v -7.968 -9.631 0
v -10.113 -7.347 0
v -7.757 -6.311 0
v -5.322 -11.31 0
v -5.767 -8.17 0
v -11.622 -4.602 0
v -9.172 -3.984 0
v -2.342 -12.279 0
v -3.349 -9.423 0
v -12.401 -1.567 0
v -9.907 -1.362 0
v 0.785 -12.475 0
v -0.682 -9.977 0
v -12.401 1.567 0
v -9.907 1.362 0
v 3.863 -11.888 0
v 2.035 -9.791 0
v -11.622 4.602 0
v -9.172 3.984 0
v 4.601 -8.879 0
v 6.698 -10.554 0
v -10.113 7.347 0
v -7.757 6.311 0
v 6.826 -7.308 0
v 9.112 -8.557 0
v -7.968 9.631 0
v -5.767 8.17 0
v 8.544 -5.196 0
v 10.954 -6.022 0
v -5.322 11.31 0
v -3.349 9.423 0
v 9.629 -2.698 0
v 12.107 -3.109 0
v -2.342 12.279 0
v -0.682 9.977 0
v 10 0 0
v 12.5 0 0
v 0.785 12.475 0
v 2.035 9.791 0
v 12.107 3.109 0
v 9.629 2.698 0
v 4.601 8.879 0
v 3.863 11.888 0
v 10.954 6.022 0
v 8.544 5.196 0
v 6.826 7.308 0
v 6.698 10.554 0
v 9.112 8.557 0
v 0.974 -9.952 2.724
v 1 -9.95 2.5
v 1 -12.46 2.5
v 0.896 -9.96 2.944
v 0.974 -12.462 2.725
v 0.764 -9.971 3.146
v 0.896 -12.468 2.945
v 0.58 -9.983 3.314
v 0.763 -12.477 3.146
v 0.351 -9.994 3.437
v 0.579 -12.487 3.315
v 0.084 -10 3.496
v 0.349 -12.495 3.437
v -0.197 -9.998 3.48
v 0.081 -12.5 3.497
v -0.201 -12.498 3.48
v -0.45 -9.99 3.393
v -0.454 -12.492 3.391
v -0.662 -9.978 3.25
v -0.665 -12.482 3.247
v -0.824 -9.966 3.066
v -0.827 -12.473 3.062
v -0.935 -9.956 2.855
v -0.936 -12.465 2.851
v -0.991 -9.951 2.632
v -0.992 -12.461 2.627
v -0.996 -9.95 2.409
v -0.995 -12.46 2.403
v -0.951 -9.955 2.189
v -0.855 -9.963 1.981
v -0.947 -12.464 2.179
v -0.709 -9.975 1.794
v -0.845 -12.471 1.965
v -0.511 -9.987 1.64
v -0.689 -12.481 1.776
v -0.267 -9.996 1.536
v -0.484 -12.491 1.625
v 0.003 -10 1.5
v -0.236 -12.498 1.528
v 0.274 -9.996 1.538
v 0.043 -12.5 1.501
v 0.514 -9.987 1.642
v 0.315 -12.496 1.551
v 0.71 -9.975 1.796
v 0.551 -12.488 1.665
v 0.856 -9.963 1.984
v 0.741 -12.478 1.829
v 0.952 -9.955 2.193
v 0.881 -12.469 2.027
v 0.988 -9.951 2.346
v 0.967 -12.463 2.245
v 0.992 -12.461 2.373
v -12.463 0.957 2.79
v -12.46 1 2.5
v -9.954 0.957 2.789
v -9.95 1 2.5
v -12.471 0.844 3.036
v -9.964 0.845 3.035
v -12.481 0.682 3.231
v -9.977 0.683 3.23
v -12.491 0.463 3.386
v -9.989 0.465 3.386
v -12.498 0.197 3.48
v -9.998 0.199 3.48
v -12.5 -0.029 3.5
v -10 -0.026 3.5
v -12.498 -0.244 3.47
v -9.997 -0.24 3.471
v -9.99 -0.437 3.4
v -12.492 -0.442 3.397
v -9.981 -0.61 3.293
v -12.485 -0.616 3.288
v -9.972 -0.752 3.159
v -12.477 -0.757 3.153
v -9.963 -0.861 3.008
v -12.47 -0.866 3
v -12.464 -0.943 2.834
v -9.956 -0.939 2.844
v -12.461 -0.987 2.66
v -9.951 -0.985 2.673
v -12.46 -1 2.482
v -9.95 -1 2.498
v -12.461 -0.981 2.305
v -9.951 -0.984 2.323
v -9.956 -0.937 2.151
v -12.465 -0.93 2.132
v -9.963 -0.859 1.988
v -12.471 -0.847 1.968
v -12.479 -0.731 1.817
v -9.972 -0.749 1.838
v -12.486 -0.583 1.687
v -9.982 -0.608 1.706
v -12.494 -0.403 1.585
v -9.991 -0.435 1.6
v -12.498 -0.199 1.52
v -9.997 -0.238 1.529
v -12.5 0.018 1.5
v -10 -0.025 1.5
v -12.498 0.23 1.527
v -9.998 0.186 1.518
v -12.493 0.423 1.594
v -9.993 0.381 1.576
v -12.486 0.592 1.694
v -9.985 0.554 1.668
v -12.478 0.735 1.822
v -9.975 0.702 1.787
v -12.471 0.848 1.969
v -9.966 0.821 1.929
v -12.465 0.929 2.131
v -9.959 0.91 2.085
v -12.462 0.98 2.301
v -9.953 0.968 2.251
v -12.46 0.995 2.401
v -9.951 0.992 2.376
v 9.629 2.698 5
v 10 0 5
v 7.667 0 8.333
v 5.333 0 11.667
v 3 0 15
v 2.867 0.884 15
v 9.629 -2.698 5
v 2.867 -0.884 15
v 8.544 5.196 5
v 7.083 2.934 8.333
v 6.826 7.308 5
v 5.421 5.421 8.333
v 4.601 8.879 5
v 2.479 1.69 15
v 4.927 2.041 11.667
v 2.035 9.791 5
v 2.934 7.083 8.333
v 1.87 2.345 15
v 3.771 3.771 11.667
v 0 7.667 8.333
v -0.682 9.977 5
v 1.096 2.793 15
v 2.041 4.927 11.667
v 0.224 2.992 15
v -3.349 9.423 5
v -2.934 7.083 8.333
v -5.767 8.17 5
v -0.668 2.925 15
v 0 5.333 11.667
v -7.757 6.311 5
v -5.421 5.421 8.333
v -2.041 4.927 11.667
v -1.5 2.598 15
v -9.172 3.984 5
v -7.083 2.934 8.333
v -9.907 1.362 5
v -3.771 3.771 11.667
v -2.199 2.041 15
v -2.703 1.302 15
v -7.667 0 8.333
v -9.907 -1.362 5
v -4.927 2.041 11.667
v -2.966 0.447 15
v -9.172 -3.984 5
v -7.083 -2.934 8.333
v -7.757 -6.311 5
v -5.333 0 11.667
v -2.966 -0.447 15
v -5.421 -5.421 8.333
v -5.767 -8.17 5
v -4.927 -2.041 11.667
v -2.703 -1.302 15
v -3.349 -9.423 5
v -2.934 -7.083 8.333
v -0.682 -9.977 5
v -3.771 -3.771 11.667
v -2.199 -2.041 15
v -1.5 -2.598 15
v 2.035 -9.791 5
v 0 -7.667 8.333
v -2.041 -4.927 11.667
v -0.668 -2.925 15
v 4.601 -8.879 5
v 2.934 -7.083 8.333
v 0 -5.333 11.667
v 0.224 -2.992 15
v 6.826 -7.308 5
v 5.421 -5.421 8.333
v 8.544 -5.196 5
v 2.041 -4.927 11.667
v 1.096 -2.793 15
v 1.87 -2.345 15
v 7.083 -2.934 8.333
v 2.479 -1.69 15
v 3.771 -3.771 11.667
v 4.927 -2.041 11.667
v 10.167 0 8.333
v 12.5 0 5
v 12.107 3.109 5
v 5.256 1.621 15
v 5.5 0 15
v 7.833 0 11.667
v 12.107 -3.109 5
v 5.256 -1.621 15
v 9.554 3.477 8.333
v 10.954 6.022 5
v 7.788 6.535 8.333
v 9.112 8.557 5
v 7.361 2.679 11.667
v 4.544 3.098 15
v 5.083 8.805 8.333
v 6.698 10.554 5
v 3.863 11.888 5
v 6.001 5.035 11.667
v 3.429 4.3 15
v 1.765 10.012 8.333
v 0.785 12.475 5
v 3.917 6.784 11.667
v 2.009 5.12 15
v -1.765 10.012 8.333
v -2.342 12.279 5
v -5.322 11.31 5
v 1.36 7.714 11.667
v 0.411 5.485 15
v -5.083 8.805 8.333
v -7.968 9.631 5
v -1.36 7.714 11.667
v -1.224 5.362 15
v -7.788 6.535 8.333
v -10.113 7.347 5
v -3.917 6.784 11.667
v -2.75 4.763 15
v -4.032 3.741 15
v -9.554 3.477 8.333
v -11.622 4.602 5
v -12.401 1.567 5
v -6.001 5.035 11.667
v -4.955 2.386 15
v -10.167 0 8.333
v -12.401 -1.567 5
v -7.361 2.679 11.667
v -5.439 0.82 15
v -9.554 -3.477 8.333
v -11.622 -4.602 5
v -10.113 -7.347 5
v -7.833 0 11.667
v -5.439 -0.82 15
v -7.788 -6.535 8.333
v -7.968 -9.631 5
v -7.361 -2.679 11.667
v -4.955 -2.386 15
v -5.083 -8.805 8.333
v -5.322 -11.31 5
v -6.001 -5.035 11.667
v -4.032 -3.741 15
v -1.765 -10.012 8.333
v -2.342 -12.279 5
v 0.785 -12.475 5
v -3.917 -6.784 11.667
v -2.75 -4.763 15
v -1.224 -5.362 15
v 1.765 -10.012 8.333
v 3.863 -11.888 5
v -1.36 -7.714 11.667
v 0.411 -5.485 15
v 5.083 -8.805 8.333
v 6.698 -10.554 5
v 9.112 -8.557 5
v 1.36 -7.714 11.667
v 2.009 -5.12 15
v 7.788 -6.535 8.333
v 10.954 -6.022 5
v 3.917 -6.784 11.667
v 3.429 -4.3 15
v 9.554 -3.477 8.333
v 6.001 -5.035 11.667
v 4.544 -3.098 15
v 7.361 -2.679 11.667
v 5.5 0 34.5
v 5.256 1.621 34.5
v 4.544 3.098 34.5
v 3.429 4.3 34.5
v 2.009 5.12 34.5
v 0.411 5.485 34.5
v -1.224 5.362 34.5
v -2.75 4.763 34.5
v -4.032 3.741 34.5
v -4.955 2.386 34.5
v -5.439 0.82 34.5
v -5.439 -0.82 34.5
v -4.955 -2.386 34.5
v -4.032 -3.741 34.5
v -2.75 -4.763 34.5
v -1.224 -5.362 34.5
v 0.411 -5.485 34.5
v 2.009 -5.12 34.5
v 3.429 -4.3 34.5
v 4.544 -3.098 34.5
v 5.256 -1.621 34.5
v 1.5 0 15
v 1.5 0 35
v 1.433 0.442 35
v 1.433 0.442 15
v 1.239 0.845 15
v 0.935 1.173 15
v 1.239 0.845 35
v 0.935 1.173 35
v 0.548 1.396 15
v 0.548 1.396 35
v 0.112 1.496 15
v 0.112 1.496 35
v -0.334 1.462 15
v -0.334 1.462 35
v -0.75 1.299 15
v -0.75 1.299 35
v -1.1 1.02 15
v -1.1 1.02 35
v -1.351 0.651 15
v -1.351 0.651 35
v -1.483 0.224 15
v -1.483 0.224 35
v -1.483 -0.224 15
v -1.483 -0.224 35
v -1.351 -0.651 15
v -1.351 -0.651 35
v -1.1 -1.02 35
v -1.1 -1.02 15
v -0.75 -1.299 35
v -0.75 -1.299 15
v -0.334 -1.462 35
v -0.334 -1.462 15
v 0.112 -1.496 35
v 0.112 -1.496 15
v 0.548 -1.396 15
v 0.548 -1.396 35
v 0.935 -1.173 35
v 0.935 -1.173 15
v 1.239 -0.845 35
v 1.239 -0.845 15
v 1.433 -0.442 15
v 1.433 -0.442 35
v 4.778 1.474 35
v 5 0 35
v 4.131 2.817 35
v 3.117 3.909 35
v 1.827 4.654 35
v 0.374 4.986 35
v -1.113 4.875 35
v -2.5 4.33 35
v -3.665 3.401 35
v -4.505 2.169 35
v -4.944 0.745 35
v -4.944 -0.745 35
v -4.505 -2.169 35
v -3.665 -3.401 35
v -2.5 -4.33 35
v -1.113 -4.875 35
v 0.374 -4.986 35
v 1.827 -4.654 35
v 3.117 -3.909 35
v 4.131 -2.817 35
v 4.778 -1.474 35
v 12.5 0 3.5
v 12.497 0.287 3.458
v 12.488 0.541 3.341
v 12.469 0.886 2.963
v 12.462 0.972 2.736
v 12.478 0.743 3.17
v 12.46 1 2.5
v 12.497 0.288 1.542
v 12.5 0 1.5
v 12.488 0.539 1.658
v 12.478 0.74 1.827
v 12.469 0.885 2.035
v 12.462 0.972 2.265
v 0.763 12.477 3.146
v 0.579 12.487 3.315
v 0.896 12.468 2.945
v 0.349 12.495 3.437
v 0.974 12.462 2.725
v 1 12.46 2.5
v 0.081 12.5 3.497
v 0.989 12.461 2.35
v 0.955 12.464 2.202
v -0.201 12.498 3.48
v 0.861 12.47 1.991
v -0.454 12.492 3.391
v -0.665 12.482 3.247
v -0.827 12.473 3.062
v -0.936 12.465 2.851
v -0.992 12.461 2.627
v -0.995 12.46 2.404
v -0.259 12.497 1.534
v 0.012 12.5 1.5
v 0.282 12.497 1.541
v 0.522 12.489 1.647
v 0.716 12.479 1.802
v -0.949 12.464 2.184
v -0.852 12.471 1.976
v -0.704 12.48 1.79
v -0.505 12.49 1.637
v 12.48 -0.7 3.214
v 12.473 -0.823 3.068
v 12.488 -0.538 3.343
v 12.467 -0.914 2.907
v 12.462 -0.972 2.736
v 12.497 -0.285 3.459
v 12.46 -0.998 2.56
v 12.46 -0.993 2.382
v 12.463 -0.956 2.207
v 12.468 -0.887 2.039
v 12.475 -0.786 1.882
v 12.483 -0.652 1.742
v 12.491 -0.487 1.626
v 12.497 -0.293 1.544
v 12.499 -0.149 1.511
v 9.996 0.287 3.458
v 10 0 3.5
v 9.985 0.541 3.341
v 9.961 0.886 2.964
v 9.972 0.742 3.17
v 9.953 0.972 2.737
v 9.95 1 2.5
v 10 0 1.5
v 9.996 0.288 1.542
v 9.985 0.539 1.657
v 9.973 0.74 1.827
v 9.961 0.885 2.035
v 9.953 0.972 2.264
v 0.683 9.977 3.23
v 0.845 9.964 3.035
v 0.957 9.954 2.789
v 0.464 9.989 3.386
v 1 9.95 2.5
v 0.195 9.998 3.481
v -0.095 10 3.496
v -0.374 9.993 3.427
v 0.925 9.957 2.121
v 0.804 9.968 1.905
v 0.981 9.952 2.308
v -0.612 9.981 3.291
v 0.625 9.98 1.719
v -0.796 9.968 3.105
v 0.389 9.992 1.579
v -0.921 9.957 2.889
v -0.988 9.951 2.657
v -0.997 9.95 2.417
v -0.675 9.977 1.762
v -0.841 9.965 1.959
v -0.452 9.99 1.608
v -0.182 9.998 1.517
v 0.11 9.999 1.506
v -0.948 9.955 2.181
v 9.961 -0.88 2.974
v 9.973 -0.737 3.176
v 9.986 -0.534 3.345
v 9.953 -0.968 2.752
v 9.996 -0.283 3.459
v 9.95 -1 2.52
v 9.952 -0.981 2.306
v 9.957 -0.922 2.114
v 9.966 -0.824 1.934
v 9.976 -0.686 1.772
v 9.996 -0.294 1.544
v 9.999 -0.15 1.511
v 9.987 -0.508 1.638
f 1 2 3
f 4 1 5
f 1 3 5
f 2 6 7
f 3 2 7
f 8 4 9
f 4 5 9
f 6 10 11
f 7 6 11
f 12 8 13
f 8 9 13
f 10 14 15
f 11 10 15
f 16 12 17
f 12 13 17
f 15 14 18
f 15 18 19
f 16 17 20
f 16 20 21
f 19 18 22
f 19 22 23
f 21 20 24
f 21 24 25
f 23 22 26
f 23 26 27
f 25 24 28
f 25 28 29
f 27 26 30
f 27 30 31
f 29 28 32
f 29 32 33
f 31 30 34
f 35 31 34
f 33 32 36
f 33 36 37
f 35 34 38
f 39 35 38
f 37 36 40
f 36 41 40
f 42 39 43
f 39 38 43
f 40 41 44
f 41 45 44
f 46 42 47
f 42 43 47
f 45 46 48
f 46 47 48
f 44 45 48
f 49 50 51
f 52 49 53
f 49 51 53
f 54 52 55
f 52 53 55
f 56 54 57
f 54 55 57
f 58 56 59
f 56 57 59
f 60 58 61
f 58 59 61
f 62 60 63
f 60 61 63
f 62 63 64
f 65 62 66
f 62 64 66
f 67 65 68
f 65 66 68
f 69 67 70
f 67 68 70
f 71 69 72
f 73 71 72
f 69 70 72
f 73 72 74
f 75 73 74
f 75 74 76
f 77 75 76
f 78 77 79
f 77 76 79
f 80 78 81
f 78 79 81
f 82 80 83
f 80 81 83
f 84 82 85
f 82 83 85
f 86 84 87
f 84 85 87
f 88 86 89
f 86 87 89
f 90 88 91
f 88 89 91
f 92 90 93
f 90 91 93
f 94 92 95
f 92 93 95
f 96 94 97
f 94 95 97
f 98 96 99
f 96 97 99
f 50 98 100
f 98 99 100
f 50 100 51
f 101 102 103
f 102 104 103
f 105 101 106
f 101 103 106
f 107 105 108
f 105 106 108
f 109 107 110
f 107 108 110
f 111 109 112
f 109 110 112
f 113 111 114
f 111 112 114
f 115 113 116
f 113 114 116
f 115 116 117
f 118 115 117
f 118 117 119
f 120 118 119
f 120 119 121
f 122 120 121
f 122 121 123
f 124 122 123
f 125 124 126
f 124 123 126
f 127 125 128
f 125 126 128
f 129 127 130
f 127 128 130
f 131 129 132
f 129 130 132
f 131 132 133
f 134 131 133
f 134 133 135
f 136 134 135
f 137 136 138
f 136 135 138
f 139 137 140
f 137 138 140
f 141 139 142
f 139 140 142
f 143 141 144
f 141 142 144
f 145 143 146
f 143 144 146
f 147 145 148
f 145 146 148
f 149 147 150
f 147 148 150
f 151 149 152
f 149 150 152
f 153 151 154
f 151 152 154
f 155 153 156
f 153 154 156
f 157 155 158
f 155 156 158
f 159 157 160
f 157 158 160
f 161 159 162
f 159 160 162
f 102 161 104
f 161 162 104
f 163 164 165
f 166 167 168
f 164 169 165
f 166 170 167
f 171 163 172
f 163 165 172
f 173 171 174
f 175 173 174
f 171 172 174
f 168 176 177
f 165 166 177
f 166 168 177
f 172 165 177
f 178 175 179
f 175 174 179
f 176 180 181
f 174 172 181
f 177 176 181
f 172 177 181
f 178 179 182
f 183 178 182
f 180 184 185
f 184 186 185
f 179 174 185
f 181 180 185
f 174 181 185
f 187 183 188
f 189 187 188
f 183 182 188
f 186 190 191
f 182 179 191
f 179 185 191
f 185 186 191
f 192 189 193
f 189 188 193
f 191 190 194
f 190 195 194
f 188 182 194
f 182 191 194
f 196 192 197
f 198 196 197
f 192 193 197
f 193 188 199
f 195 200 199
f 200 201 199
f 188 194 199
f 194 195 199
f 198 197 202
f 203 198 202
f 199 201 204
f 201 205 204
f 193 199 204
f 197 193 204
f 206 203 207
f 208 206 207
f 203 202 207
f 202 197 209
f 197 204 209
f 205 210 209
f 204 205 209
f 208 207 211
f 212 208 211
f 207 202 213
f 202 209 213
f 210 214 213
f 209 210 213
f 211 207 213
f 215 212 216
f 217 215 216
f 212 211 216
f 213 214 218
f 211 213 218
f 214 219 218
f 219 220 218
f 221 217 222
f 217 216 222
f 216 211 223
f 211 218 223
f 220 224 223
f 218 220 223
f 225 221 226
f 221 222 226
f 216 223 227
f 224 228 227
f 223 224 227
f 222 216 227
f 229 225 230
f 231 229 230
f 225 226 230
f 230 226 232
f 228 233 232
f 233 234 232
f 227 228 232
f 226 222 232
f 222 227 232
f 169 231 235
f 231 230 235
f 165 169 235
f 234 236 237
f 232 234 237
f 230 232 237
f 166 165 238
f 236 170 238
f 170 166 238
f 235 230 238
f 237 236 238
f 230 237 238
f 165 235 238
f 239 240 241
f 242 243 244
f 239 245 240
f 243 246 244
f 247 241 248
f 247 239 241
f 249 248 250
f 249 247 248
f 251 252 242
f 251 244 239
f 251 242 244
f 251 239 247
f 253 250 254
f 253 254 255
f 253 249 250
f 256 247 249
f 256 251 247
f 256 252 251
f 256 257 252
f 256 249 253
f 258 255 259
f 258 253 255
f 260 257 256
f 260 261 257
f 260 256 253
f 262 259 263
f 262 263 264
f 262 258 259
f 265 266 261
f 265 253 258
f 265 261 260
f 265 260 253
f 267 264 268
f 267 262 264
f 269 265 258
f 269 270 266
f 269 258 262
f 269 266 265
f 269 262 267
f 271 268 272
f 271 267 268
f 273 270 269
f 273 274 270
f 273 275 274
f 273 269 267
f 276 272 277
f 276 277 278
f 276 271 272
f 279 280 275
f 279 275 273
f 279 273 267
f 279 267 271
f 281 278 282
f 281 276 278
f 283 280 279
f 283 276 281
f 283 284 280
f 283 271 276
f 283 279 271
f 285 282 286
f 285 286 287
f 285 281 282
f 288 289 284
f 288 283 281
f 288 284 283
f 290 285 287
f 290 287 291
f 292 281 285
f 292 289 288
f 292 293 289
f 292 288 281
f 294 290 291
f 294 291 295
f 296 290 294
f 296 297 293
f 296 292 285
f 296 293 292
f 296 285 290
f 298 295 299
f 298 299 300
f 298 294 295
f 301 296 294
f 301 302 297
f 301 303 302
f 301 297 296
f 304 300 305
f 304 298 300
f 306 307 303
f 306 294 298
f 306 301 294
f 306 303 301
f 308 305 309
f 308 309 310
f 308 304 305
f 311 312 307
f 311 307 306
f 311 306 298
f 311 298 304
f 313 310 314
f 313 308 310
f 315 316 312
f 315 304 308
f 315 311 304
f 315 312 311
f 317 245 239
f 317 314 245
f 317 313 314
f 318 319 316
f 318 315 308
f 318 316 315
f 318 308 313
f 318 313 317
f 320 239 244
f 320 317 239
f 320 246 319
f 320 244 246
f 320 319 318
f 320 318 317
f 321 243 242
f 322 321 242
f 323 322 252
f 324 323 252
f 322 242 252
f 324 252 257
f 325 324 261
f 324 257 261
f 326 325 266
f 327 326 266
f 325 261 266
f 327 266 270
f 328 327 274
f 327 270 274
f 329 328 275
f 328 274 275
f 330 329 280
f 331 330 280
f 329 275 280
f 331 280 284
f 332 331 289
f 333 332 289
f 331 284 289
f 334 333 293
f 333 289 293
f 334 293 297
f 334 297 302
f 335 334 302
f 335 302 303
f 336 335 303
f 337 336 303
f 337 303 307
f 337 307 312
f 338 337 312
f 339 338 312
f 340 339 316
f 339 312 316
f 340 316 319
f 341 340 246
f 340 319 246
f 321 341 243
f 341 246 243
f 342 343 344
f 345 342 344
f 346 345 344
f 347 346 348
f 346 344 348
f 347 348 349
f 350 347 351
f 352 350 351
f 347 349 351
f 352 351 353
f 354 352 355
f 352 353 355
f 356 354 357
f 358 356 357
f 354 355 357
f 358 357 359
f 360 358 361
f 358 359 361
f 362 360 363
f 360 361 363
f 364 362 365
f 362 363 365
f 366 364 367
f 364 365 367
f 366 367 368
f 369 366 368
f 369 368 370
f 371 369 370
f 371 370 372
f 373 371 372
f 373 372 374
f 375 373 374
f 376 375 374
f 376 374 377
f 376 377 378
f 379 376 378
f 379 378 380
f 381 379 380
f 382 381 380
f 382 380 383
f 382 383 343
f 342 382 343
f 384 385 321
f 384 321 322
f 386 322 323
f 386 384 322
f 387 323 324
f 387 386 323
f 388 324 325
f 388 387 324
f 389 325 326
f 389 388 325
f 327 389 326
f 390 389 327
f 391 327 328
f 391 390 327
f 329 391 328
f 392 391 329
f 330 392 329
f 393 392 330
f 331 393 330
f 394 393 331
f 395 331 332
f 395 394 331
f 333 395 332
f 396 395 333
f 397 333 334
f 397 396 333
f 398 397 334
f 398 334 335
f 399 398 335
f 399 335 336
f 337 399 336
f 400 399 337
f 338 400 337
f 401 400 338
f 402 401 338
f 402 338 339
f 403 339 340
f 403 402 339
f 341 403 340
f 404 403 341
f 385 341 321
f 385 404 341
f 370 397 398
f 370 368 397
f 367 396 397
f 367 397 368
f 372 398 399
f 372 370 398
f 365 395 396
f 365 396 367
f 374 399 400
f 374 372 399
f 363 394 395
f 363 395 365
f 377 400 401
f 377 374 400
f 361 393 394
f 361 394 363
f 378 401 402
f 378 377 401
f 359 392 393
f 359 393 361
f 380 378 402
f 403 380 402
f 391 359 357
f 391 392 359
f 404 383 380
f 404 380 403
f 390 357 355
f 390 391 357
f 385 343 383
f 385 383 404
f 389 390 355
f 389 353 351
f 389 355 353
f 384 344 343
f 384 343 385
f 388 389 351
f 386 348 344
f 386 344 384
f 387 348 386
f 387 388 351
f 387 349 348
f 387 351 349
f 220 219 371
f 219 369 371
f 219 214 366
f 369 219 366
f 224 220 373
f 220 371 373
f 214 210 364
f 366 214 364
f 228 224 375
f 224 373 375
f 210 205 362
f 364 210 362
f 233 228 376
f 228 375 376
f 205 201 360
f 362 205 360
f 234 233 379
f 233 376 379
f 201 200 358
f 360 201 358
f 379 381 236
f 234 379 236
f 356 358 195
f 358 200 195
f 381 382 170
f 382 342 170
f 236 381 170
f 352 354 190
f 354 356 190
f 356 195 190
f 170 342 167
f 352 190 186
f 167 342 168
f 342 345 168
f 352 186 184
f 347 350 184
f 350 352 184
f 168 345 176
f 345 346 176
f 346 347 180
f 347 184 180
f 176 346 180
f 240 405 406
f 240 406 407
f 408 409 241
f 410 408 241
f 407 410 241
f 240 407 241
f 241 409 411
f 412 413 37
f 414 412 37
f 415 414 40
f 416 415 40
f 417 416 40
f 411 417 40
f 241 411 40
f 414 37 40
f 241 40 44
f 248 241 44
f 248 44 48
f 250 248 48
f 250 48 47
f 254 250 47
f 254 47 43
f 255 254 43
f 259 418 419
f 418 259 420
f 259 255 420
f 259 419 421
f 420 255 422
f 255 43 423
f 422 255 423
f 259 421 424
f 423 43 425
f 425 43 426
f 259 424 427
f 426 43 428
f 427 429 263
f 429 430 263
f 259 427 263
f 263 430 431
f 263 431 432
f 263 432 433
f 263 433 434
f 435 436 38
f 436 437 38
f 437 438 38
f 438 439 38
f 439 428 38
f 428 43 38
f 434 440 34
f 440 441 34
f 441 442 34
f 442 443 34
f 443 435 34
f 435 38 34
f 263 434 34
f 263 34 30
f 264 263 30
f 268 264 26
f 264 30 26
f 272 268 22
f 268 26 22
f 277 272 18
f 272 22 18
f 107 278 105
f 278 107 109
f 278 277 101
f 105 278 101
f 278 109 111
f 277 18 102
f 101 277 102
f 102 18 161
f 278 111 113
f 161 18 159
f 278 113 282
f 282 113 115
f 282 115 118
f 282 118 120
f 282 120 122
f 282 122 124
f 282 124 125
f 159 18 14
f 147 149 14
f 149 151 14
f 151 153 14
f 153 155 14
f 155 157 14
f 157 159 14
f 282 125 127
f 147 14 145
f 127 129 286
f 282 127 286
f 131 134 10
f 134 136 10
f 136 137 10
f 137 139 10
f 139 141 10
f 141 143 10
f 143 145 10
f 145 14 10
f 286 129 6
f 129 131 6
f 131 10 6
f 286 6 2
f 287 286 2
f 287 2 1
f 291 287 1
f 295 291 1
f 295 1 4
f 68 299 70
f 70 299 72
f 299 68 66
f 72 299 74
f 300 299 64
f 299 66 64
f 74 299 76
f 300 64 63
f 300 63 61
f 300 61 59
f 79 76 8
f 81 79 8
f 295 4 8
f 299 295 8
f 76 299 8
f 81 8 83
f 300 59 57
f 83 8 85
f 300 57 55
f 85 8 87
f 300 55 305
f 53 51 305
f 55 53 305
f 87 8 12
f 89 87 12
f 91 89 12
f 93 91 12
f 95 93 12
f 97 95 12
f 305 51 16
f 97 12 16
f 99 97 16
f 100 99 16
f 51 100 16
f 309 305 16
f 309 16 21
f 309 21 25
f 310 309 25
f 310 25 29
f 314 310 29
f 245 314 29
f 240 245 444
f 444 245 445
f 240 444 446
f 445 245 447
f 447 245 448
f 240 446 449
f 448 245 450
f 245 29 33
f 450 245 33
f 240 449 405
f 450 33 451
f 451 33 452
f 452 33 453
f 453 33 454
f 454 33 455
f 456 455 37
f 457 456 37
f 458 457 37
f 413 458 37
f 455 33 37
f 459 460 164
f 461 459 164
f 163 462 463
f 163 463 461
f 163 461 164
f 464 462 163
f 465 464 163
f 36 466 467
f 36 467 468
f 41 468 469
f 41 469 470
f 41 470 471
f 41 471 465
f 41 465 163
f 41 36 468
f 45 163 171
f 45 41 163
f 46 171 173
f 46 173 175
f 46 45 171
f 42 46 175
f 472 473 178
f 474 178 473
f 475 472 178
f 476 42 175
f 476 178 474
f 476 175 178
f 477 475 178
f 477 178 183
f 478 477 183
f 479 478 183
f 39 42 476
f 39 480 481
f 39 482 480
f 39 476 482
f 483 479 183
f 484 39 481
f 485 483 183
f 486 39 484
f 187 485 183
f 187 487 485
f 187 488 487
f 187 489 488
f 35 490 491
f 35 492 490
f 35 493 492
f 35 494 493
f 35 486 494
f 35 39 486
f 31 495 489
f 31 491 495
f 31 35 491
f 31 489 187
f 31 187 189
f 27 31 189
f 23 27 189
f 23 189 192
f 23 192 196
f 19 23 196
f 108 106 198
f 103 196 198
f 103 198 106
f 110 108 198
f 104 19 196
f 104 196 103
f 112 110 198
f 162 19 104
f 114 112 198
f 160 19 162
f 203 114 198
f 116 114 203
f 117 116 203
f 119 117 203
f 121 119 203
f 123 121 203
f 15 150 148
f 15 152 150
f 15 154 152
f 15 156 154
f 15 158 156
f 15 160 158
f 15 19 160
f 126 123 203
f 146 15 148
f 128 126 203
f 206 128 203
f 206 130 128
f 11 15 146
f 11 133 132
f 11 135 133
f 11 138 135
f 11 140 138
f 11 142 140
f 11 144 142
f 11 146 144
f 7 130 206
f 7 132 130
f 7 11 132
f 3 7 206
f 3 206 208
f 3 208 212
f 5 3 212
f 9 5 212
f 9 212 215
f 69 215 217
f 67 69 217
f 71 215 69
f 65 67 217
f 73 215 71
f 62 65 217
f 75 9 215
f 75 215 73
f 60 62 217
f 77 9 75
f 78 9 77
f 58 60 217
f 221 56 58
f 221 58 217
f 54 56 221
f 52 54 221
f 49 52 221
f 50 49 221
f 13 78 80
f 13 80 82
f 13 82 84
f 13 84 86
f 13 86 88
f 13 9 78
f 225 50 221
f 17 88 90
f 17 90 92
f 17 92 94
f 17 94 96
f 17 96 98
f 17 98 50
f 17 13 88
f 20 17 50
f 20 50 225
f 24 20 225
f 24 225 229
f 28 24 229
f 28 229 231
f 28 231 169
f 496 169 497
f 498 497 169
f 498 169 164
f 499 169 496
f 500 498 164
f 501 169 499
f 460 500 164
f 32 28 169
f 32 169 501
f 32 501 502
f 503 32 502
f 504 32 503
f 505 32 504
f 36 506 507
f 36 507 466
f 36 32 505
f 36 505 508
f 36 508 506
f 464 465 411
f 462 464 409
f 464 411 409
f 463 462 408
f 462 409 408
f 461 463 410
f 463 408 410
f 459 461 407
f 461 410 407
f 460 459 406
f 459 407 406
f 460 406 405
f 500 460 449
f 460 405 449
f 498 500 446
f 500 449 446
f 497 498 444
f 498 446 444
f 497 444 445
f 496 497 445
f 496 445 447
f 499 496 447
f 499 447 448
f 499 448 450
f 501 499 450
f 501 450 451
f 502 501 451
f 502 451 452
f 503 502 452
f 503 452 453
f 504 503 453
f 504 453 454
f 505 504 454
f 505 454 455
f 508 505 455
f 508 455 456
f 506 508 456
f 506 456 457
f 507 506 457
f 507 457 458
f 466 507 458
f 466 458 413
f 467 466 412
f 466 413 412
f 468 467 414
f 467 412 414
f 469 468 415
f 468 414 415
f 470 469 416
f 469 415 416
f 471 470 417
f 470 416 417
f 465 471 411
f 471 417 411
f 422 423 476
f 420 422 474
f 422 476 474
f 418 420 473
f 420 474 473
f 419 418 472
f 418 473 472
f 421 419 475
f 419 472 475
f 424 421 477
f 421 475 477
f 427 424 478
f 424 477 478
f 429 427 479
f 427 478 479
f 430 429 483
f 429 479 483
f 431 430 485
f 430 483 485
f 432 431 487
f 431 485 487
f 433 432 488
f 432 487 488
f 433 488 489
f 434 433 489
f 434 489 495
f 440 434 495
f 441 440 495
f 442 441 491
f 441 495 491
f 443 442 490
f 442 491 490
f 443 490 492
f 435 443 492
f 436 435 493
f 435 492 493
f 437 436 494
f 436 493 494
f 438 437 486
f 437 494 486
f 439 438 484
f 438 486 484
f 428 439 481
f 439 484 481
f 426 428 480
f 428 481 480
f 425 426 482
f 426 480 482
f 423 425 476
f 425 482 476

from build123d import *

# Parameters (mm, degrees)
F0_R      = 12.5
F0_R_2    = 10
F1_DEPTH  = 5
F4_R      = 12.5
F3_R      = 5.5
F6_R      = 10
F7_R      = 3
F9_R      = 5.5
F10_DEPTH = 20
F11_SIZE  = 0.5
F12_R     = 1
F13_DEPTH = 25
F14_R     = 1
F15_DEPTH = 25
F16_R     = 1.5
F17_DEPTH = 35.001


with BuildPart() as f1:
    # F0 (on Top) → F1 (new body)
    with BuildSketch(Plane.XY):
        Circle(F0_R)
        Circle(F0_R_2, mode=Mode.SUBTRACT)
    extrude(amount=F1_DEPTH)

    # F4 (on face) → F5 section 0
    with BuildSketch(Plane.XY.offset(5)):
        Circle(F4_R)
    # F3 (on offset) → F5 section 1
    with BuildSketch(Plane.XY.offset(15)):
        Circle(F3_R)
    loft()

    # F6 (on face) → F8 section 0
    with BuildSketch(Plane.XY.offset(5)):
        Circle(F6_R)
    # F7 (on offset) → F8 section 1
    with BuildSketch(Plane.XY.offset(15)):
        Circle(F7_R)
    loft(mode=Mode.SUBTRACT)

    # F9 (on face) → F10 (join)
    with BuildSketch(Plane.XY.offset(15)):
        Circle(F9_R)
    extrude(amount=F10_DEPTH)

    # F11
    f11_edges = [f1.edges().sort_by_distance(p)[0] for p in [
        (-5.5, 0, 35),
    ]]
    chamfer(f11_edges, length=F11_SIZE)

    # F12 (on Right) → F13 (cut, symmetric)
    with BuildSketch(Plane.YZ):
        with Locations((0, 2.5)):
            Circle(F12_R)
    extrude(amount=F13_DEPTH, both=True, mode=Mode.SUBTRACT)

    # F14 (on Front) → F15 (cut, symmetric)
    with BuildSketch(Plane.XZ):
        with Locations((0, 2.5)):
            Circle(F14_R)
    extrude(amount=F15_DEPTH, both=True, mode=Mode.SUBTRACT)

    # F16 (on face) → F17 (cut, through all)
    with BuildSketch(Plane.XY.offset(35)):
        Circle(F16_R)
    extrude(amount=-F17_DEPTH, mode=Mode.SUBTRACT)


solid = f1.part
